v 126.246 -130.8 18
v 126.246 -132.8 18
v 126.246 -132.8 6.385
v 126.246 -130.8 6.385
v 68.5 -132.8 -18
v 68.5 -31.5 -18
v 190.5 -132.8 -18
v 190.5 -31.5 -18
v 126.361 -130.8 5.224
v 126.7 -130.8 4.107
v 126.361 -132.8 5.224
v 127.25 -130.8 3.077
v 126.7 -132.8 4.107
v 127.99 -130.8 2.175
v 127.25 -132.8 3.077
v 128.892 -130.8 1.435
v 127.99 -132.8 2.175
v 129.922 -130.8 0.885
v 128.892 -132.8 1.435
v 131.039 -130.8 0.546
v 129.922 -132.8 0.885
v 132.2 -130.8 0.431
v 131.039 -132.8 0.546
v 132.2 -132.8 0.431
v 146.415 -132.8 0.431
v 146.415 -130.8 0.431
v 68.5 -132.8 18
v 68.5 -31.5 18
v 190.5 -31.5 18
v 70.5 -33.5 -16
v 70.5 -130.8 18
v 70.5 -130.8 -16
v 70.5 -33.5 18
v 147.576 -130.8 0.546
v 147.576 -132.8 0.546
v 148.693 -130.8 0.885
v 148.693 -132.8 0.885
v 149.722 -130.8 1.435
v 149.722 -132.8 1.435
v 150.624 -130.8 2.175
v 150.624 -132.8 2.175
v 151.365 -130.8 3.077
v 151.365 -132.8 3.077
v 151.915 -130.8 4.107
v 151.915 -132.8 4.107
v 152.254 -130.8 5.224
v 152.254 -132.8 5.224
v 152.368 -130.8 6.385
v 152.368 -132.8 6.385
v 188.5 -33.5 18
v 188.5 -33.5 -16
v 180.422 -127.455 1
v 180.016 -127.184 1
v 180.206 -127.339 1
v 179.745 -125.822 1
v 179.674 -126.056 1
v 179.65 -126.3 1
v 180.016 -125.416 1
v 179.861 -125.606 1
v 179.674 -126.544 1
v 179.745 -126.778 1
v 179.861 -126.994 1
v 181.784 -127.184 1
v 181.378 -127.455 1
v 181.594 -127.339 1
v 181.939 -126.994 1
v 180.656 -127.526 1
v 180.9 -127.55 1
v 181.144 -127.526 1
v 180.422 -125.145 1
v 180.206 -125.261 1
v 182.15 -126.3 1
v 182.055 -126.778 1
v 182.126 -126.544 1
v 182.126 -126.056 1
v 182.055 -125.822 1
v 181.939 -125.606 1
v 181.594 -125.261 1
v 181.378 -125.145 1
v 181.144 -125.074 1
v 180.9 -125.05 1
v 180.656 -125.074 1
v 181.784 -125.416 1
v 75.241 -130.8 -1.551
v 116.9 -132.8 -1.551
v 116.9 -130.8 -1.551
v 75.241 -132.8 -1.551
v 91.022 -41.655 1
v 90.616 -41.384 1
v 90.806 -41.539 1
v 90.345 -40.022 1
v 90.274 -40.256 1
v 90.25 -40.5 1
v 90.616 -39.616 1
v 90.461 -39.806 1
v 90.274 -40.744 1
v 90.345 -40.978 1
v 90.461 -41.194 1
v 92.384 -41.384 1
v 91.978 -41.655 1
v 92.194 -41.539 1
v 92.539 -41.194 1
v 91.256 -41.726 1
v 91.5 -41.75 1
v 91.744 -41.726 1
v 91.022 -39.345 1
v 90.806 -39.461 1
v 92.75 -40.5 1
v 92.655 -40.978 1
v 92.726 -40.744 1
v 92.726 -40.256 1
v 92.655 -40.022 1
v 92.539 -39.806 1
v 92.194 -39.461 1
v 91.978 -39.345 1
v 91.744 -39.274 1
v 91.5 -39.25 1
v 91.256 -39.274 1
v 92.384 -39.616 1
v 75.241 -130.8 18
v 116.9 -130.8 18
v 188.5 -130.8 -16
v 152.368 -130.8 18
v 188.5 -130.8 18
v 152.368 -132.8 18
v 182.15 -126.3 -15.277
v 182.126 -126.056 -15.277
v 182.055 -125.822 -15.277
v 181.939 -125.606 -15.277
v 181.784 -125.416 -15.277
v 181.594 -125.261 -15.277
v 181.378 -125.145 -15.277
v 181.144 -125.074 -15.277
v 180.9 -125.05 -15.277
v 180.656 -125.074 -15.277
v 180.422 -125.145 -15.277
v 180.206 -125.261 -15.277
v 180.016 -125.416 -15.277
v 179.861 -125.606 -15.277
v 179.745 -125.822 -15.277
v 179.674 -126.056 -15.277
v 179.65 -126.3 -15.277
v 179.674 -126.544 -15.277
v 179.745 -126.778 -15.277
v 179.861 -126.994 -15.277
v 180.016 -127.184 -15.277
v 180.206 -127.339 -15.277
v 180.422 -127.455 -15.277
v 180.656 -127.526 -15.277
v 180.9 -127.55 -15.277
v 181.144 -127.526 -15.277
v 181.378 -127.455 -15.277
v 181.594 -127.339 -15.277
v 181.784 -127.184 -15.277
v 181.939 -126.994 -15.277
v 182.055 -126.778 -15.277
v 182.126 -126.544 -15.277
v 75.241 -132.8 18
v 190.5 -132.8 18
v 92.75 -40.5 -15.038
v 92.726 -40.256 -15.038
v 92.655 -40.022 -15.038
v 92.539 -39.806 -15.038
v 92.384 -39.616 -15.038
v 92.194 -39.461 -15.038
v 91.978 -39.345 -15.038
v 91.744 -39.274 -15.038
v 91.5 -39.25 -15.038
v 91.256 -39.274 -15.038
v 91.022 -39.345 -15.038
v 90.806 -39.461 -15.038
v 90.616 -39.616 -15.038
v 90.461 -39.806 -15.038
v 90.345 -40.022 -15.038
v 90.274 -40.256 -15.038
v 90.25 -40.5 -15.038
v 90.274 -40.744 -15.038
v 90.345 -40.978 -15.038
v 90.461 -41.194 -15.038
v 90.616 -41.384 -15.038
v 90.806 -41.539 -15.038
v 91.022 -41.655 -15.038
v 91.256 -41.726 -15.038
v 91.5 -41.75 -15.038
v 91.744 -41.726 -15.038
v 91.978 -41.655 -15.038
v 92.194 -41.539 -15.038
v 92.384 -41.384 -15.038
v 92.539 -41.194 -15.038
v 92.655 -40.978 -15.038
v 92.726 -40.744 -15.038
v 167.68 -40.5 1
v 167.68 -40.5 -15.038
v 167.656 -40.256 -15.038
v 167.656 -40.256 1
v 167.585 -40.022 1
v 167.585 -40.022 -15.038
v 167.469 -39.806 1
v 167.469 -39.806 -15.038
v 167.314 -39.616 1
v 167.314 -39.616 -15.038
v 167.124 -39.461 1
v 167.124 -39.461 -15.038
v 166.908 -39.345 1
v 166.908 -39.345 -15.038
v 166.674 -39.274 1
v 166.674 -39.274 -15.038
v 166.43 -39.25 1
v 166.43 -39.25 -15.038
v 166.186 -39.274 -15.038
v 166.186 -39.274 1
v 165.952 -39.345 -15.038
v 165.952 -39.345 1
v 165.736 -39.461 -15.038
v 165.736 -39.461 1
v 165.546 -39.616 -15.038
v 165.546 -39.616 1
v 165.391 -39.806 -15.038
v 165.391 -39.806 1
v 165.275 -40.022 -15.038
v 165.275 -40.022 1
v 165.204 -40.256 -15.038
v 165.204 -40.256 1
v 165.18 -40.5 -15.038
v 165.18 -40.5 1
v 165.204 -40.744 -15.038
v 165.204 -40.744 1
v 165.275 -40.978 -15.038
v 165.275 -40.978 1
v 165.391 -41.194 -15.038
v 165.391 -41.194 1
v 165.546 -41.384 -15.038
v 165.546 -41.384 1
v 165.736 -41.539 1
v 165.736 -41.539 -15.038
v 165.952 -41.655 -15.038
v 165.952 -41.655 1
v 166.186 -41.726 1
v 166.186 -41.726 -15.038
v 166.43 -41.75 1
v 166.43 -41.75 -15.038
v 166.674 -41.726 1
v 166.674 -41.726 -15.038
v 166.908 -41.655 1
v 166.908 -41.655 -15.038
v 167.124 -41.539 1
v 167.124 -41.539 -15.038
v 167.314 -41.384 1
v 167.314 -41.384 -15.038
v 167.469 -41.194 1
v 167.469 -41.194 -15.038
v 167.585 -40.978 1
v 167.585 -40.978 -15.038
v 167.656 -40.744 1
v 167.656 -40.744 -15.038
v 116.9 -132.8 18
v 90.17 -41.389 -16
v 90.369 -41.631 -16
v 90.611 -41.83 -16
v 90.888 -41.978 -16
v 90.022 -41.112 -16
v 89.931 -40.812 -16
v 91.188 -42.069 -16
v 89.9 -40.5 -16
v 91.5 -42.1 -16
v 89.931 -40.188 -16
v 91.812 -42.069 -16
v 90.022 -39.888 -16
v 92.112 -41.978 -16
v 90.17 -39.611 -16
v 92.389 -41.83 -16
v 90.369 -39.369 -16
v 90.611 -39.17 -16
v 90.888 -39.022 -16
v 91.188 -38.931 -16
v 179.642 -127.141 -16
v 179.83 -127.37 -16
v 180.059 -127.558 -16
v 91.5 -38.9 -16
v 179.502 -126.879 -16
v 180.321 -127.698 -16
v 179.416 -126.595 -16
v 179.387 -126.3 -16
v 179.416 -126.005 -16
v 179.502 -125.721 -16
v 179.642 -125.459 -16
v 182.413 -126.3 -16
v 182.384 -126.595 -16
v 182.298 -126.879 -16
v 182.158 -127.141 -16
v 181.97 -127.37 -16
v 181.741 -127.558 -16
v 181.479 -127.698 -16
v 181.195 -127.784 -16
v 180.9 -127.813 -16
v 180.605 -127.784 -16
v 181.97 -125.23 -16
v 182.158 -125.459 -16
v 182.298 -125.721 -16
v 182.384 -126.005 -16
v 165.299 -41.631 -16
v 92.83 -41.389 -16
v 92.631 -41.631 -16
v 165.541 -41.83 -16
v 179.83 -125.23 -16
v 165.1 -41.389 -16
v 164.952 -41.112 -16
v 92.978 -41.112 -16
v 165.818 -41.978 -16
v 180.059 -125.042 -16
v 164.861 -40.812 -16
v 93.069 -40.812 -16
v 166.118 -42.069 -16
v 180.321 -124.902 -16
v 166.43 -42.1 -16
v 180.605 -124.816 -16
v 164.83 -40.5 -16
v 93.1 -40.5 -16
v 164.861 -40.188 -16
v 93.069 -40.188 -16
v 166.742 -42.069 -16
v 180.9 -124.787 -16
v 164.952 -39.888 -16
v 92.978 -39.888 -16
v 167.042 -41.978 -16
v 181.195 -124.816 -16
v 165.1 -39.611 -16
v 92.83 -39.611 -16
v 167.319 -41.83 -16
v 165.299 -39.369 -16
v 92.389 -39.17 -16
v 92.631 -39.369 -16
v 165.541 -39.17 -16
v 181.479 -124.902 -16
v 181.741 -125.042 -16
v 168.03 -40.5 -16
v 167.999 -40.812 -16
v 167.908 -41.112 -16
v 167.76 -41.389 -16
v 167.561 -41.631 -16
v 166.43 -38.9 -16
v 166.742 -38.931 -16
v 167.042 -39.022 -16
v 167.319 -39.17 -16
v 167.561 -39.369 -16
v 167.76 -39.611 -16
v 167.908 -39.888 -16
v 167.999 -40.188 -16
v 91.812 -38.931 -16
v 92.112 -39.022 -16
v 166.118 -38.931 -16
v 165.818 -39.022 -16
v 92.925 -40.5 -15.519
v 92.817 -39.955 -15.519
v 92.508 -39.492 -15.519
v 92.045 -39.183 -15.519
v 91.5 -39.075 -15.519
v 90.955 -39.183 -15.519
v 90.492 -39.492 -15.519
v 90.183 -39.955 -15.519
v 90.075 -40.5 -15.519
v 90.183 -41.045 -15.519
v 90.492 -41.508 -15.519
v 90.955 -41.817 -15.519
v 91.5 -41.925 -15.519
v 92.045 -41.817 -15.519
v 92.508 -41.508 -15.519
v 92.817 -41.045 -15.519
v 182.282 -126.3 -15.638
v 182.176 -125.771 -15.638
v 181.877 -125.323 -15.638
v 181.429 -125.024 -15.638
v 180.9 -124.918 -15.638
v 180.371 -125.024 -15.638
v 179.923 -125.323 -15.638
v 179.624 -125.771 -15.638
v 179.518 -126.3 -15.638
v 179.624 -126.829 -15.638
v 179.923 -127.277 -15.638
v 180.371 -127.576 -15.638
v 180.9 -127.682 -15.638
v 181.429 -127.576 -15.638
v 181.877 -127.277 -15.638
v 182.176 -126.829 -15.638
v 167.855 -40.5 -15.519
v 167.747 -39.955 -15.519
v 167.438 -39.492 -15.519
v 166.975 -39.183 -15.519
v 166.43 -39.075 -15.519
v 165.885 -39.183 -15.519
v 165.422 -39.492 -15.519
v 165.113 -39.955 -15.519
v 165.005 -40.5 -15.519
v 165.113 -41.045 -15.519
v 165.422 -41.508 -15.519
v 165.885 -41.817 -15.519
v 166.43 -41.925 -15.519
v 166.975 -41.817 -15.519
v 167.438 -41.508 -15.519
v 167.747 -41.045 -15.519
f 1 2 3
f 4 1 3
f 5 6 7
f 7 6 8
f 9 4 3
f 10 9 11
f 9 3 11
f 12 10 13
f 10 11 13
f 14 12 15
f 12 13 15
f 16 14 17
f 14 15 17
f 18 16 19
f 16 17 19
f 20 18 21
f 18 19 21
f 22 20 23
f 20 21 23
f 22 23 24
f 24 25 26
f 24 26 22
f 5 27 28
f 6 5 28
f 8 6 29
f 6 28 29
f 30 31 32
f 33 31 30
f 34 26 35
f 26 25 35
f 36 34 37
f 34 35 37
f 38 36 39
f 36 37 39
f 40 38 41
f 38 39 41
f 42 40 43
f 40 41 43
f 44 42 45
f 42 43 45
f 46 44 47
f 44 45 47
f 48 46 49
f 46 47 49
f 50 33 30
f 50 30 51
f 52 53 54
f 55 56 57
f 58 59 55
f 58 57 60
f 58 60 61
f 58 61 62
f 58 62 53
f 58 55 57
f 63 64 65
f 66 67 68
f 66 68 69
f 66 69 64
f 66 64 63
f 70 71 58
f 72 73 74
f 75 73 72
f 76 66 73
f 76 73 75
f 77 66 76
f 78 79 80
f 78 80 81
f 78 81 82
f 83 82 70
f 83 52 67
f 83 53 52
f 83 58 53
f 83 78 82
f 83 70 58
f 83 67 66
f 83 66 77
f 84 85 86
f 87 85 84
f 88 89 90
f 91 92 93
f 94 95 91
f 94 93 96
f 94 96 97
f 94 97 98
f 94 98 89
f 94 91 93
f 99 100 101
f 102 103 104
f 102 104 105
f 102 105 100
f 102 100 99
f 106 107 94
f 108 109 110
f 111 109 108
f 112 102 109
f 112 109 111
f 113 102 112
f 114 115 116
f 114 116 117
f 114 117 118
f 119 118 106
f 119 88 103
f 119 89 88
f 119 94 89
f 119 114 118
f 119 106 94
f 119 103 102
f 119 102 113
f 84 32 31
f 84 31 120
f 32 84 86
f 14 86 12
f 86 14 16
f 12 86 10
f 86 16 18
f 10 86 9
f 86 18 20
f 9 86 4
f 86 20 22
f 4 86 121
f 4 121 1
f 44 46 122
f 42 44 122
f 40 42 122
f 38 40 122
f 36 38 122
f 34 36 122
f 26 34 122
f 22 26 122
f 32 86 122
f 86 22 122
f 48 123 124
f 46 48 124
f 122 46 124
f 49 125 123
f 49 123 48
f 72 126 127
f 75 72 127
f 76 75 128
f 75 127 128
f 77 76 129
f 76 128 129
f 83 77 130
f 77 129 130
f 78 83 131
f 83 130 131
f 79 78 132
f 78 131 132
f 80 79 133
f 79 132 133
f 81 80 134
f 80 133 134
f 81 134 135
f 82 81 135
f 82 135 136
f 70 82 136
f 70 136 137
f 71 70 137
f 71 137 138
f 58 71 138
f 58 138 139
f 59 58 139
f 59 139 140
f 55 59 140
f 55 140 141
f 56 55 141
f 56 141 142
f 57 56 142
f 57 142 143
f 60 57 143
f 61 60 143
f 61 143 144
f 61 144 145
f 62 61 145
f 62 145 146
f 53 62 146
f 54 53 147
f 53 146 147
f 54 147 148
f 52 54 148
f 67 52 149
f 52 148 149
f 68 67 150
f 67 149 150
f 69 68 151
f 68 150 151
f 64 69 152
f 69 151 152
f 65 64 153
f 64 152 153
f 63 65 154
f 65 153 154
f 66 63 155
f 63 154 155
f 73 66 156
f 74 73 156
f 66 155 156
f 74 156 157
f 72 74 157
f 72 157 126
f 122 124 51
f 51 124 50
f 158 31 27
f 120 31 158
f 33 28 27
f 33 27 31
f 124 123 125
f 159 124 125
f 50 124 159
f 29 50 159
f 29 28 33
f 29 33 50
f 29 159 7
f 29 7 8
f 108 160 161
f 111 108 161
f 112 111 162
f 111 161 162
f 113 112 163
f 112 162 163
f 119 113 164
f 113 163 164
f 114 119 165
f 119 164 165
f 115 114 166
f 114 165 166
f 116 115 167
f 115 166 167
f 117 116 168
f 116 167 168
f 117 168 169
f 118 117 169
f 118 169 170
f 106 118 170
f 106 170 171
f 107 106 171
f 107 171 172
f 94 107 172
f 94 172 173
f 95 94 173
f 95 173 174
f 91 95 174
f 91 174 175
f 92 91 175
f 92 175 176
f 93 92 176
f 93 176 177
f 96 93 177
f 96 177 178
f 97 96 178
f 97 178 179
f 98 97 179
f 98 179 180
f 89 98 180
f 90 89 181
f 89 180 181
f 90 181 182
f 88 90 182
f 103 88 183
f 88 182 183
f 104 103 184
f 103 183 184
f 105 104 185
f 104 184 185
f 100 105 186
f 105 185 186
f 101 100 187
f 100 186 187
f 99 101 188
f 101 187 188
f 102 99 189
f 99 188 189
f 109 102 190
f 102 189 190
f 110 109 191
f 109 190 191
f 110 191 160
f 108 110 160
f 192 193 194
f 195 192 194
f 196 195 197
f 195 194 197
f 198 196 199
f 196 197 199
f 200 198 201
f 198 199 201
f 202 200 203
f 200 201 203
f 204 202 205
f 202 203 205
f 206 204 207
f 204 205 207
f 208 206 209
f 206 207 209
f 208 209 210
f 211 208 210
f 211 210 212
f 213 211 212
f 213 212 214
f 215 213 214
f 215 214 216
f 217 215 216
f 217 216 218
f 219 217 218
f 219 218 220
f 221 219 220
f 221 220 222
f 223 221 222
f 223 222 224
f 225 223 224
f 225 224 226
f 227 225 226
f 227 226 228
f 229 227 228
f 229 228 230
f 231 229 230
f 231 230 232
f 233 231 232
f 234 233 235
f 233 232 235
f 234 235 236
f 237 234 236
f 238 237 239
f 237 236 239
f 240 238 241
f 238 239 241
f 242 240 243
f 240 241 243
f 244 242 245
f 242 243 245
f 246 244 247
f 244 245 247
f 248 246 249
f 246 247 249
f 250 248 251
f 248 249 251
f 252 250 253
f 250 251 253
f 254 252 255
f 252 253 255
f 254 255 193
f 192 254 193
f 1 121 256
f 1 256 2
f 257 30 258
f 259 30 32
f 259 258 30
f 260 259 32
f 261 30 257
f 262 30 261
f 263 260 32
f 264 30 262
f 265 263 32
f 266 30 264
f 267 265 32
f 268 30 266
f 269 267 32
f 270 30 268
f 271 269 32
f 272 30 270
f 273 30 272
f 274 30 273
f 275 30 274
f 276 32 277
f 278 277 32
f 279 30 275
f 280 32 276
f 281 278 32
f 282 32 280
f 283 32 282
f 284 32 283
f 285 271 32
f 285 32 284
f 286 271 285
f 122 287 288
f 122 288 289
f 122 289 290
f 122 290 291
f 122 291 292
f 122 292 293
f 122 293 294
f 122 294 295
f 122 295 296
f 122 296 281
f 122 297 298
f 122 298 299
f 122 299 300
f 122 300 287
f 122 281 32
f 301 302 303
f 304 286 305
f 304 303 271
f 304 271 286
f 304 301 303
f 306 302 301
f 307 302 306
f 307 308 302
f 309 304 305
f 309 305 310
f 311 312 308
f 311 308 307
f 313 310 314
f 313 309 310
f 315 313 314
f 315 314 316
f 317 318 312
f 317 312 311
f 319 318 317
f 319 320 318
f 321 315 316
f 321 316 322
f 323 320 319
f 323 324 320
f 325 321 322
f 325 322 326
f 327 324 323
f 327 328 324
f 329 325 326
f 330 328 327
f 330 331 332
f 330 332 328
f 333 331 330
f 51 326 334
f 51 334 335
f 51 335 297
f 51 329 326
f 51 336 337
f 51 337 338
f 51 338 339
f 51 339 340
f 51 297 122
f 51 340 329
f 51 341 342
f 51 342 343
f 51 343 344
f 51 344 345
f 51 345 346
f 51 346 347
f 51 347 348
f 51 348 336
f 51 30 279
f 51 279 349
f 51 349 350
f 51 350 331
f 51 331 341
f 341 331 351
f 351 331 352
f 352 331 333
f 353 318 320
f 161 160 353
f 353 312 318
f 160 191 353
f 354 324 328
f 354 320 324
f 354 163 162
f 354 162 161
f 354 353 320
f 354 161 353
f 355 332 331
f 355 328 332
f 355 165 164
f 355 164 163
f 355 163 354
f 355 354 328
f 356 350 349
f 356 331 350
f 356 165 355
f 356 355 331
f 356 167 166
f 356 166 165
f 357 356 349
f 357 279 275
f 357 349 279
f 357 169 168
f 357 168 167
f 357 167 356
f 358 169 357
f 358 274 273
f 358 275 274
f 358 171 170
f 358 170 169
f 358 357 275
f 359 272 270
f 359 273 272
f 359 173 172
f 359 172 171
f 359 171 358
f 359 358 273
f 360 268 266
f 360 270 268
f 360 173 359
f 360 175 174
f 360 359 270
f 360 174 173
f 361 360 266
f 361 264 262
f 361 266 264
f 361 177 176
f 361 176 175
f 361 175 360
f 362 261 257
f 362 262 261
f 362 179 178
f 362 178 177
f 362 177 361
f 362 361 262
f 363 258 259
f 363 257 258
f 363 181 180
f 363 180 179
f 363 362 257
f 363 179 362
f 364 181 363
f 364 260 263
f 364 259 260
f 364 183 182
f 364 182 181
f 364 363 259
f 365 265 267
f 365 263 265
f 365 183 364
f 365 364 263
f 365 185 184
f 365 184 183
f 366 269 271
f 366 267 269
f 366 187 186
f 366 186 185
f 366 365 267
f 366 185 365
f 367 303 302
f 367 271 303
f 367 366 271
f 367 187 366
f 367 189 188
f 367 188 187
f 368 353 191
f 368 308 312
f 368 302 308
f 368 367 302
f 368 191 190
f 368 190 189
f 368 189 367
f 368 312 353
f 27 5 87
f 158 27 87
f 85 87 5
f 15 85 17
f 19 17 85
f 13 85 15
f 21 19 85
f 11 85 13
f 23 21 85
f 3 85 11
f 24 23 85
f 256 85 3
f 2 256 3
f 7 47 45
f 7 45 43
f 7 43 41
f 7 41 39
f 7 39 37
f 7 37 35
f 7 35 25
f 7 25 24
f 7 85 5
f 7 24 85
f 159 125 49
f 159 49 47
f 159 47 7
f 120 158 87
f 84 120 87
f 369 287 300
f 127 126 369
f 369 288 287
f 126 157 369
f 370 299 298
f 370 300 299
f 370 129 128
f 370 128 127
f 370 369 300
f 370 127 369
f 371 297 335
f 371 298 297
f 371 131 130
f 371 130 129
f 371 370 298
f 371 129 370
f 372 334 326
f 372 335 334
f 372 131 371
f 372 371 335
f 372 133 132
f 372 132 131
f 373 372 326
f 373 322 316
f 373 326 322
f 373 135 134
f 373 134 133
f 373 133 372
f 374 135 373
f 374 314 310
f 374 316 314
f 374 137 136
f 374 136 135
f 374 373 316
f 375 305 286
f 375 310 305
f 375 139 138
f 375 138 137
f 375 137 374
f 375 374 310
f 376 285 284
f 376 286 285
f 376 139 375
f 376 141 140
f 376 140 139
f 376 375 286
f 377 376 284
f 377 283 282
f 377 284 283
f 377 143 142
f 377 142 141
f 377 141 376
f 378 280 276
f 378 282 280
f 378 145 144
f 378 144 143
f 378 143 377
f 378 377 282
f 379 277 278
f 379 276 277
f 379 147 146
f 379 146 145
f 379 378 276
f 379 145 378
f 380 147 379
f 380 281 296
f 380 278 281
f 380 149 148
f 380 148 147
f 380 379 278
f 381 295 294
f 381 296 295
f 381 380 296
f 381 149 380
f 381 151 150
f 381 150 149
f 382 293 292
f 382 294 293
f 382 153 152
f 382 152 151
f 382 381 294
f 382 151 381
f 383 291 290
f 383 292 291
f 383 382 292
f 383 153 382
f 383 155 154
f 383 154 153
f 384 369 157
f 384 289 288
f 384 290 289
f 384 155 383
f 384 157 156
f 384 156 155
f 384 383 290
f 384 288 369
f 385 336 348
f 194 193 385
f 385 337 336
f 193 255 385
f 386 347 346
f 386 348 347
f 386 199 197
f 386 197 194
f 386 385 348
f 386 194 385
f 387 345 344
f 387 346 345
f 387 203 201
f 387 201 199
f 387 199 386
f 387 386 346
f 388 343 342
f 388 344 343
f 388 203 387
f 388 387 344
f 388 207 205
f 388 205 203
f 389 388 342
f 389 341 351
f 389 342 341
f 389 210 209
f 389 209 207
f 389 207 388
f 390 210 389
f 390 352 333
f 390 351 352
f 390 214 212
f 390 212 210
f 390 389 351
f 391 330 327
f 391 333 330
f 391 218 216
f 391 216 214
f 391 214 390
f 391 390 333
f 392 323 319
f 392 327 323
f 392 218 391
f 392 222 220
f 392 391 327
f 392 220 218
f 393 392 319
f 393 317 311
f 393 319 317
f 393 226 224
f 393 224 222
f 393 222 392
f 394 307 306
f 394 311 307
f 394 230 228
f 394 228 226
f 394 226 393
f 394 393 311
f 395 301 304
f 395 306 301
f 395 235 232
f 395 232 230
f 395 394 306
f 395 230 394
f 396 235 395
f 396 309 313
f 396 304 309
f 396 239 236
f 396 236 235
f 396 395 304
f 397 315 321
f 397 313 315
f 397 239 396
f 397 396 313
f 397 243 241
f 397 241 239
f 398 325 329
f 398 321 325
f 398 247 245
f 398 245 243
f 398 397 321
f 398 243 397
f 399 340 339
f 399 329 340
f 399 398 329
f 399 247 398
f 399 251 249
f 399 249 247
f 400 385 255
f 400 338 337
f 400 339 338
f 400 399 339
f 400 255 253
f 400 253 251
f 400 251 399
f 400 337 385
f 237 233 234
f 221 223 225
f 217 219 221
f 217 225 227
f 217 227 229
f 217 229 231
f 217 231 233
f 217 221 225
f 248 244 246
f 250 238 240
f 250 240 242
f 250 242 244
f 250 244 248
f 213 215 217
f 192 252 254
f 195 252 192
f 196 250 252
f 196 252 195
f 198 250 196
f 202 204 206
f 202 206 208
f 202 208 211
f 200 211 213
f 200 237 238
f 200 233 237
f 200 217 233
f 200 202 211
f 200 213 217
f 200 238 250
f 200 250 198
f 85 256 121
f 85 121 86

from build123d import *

# Parameters (mm, degrees)
SKETCH1_W            = 122
SKETCH1_H            = 101.3
BOSS_EXTRUDE1_DEPTH  = 18
SKETCH2_W            = 118
SKETCH2_H            = 97.3
CUT_EXTRUDE1_DEPTH   = 34
SKETCH4_R            = 5.953519792
CUT_EXTRUDE5_DEPTH   = 2
SKETCH5_W            = 41.658553798
SKETCH5_H            = 19.550778972
CUT_EXTRUDE10_DEPTH  = 2
SKETCH9_W            = 11.907039584
SKETCH9_H            = 11.615
CUT_EXTRUDE12_DEPTH  = 5
SKETCH10_W           = 11.907039584
SKETCH10_H           = 11.615
CUT_EXTRUDE13_DEPTH  = 5
SKETCH11_R           = 1.25
BOSS_EXTRUDE6_DEPTH  = 17
SKETCH14_R           = 1.25
BOSS_EXTRUDE8_DEPTH  = 17
SKETCH15_R           = 1.25
BOSS_EXTRUDE10_DEPTH = 17
SKETCH16_W           = 14.214546847
SKETCH16_H           = 17.568519792
CUT_EXTRUDE14_DEPTH  = 5
SKETCH17_R           = 1.6
BOSS_EXTRUDE11_DEPTH = 1
BOSS_EXTRUDE11_TAPER = 20
SKETCH18_R           = 1.6
BOSS_EXTRUDE13_DEPTH = 1
BOSS_EXTRUDE13_TAPER = 20
SKETCH19_R           = 1.513275
BOSS_EXTRUDE14_DEPTH = 1
BOSS_EXTRUDE14_TAPER = 20


with BuildPart() as part:
    # Sketch1 → Boss-Extrude1 (new, symmetric)
    with BuildSketch(Plane.XY):
        with Locations((129.5, -82.15)):
            Rectangle(SKETCH1_W, SKETCH1_H)
    extrude(amount=BOSS_EXTRUDE1_DEPTH, both=True)

    # Sketch2 → Cut-Extrude1 (cut)
    with BuildSketch(Plane.XY.offset(18)):
        with Locations((129.5, -82.15)):
            Rectangle(SKETCH2_W, SKETCH2_H)
    extrude(amount=-CUT_EXTRUDE1_DEPTH, mode=Mode.SUBTRACT)

    # Sketch4 → Cut-Extrude5 (cut)
    with BuildSketch(Plane(origin=(0, -132.8, 0), x_dir=(-1, 0, 0), z_dir=(0, -1, 0))):
        with Locations(Location((-132.2, -6.385, 0), (0, 0, 90))):
            Circle(SKETCH4_R)
        with Locations(Location((-146.414546847, -6.385, 0), (0, 0, 90))):
            Circle(SKETCH4_R)
    extrude(amount=-CUT_EXTRUDE5_DEPTH, mode=Mode.SUBTRACT)

    # Sketch5 → Cut-Extrude10 (cut)
    with BuildSketch(Plane(origin=(0, -132.8, 0), x_dir=(-1, 0, 0), z_dir=(0, -1, 0))):
        with Locations((-96.070620406, -8.224610514)):
            Rectangle(SKETCH5_W, SKETCH5_H)
    extrude(amount=-CUT_EXTRUDE10_DEPTH, mode=Mode.SUBTRACT)

    # Sketch9 → Cut-Extrude12 (cut)
    with BuildSketch(Plane(origin=(0, -132.8, 0), x_dir=(-1, 0, 0), z_dir=(0, -1, 0))):
        with Locations((-146.414546847, -12.1925)):
            Rectangle(SKETCH9_W, SKETCH9_H)
    extrude(amount=-CUT_EXTRUDE12_DEPTH, mode=Mode.SUBTRACT)

    # Sketch10 → Cut-Extrude13 (cut)
    with BuildSketch(Plane(origin=(0, -132.8, 0), x_dir=(-1, 0, 0), z_dir=(0, -1, 0))):
        with Locations((-132.2, -12.1925)):
            Rectangle(SKETCH10_W, SKETCH10_H)
    extrude(amount=-CUT_EXTRUDE13_DEPTH, mode=Mode.SUBTRACT)

    # Sketch11 → Boss-Extrude6 (add)
    with BuildSketch(Plane.XY.offset(-16)):
        with Locations((91.5, -40.5)):
            Circle(SKETCH11_R)
    extrude(amount=BOSS_EXTRUDE6_DEPTH)

    # Sketch14 → Boss-Extrude8 (add)
    with BuildSketch(Plane.XY.offset(-16)):
        with Locations((166.43, -40.5)):
            Circle(SKETCH14_R)
    extrude(amount=BOSS_EXTRUDE8_DEPTH)

    # Sketch15 → Boss-Extrude10 (add)
    with BuildSketch(Plane.XY.offset(-16)):
        with Locations((180.9, -126.3)):
            Circle(SKETCH15_R)
    extrude(amount=BOSS_EXTRUDE10_DEPTH)

    # Sketch16 → Cut-Extrude14 (cut)
    with BuildSketch(Plane(origin=(0, -132.8, 0), x_dir=(-1, 0, 0), z_dir=(0, -1, 0))):
        with Locations((-139.307273424, -9.215740104)):
            Rectangle(SKETCH16_W, SKETCH16_H)
    extrude(amount=-CUT_EXTRUDE14_DEPTH, mode=Mode.SUBTRACT)

    # Sketch17 → Boss-Extrude11 (add)
    with BuildSketch(Plane.XY.offset(-16)):
        with Locations((91.5, -40.5)):
            Circle(SKETCH17_R)
    extrude(amount=BOSS_EXTRUDE11_DEPTH, taper=BOSS_EXTRUDE11_TAPER)

    # Sketch18 → Boss-Extrude13 (add)
    with BuildSketch(Plane.XY.offset(-16)):
        with Locations((166.43, -40.5)):
            Circle(SKETCH18_R)
    extrude(amount=BOSS_EXTRUDE13_DEPTH, taper=BOSS_EXTRUDE13_TAPER)

    # Sketch19 → Boss-Extrude14 (add)
    with BuildSketch(Plane.XY.offset(-16)):
        with Locations((180.9, -126.3)):
            Circle(SKETCH19_R)
    extrude(amount=BOSS_EXTRUDE14_DEPTH, taper=BOSS_EXTRUDE14_TAPER)


solid = part.part
